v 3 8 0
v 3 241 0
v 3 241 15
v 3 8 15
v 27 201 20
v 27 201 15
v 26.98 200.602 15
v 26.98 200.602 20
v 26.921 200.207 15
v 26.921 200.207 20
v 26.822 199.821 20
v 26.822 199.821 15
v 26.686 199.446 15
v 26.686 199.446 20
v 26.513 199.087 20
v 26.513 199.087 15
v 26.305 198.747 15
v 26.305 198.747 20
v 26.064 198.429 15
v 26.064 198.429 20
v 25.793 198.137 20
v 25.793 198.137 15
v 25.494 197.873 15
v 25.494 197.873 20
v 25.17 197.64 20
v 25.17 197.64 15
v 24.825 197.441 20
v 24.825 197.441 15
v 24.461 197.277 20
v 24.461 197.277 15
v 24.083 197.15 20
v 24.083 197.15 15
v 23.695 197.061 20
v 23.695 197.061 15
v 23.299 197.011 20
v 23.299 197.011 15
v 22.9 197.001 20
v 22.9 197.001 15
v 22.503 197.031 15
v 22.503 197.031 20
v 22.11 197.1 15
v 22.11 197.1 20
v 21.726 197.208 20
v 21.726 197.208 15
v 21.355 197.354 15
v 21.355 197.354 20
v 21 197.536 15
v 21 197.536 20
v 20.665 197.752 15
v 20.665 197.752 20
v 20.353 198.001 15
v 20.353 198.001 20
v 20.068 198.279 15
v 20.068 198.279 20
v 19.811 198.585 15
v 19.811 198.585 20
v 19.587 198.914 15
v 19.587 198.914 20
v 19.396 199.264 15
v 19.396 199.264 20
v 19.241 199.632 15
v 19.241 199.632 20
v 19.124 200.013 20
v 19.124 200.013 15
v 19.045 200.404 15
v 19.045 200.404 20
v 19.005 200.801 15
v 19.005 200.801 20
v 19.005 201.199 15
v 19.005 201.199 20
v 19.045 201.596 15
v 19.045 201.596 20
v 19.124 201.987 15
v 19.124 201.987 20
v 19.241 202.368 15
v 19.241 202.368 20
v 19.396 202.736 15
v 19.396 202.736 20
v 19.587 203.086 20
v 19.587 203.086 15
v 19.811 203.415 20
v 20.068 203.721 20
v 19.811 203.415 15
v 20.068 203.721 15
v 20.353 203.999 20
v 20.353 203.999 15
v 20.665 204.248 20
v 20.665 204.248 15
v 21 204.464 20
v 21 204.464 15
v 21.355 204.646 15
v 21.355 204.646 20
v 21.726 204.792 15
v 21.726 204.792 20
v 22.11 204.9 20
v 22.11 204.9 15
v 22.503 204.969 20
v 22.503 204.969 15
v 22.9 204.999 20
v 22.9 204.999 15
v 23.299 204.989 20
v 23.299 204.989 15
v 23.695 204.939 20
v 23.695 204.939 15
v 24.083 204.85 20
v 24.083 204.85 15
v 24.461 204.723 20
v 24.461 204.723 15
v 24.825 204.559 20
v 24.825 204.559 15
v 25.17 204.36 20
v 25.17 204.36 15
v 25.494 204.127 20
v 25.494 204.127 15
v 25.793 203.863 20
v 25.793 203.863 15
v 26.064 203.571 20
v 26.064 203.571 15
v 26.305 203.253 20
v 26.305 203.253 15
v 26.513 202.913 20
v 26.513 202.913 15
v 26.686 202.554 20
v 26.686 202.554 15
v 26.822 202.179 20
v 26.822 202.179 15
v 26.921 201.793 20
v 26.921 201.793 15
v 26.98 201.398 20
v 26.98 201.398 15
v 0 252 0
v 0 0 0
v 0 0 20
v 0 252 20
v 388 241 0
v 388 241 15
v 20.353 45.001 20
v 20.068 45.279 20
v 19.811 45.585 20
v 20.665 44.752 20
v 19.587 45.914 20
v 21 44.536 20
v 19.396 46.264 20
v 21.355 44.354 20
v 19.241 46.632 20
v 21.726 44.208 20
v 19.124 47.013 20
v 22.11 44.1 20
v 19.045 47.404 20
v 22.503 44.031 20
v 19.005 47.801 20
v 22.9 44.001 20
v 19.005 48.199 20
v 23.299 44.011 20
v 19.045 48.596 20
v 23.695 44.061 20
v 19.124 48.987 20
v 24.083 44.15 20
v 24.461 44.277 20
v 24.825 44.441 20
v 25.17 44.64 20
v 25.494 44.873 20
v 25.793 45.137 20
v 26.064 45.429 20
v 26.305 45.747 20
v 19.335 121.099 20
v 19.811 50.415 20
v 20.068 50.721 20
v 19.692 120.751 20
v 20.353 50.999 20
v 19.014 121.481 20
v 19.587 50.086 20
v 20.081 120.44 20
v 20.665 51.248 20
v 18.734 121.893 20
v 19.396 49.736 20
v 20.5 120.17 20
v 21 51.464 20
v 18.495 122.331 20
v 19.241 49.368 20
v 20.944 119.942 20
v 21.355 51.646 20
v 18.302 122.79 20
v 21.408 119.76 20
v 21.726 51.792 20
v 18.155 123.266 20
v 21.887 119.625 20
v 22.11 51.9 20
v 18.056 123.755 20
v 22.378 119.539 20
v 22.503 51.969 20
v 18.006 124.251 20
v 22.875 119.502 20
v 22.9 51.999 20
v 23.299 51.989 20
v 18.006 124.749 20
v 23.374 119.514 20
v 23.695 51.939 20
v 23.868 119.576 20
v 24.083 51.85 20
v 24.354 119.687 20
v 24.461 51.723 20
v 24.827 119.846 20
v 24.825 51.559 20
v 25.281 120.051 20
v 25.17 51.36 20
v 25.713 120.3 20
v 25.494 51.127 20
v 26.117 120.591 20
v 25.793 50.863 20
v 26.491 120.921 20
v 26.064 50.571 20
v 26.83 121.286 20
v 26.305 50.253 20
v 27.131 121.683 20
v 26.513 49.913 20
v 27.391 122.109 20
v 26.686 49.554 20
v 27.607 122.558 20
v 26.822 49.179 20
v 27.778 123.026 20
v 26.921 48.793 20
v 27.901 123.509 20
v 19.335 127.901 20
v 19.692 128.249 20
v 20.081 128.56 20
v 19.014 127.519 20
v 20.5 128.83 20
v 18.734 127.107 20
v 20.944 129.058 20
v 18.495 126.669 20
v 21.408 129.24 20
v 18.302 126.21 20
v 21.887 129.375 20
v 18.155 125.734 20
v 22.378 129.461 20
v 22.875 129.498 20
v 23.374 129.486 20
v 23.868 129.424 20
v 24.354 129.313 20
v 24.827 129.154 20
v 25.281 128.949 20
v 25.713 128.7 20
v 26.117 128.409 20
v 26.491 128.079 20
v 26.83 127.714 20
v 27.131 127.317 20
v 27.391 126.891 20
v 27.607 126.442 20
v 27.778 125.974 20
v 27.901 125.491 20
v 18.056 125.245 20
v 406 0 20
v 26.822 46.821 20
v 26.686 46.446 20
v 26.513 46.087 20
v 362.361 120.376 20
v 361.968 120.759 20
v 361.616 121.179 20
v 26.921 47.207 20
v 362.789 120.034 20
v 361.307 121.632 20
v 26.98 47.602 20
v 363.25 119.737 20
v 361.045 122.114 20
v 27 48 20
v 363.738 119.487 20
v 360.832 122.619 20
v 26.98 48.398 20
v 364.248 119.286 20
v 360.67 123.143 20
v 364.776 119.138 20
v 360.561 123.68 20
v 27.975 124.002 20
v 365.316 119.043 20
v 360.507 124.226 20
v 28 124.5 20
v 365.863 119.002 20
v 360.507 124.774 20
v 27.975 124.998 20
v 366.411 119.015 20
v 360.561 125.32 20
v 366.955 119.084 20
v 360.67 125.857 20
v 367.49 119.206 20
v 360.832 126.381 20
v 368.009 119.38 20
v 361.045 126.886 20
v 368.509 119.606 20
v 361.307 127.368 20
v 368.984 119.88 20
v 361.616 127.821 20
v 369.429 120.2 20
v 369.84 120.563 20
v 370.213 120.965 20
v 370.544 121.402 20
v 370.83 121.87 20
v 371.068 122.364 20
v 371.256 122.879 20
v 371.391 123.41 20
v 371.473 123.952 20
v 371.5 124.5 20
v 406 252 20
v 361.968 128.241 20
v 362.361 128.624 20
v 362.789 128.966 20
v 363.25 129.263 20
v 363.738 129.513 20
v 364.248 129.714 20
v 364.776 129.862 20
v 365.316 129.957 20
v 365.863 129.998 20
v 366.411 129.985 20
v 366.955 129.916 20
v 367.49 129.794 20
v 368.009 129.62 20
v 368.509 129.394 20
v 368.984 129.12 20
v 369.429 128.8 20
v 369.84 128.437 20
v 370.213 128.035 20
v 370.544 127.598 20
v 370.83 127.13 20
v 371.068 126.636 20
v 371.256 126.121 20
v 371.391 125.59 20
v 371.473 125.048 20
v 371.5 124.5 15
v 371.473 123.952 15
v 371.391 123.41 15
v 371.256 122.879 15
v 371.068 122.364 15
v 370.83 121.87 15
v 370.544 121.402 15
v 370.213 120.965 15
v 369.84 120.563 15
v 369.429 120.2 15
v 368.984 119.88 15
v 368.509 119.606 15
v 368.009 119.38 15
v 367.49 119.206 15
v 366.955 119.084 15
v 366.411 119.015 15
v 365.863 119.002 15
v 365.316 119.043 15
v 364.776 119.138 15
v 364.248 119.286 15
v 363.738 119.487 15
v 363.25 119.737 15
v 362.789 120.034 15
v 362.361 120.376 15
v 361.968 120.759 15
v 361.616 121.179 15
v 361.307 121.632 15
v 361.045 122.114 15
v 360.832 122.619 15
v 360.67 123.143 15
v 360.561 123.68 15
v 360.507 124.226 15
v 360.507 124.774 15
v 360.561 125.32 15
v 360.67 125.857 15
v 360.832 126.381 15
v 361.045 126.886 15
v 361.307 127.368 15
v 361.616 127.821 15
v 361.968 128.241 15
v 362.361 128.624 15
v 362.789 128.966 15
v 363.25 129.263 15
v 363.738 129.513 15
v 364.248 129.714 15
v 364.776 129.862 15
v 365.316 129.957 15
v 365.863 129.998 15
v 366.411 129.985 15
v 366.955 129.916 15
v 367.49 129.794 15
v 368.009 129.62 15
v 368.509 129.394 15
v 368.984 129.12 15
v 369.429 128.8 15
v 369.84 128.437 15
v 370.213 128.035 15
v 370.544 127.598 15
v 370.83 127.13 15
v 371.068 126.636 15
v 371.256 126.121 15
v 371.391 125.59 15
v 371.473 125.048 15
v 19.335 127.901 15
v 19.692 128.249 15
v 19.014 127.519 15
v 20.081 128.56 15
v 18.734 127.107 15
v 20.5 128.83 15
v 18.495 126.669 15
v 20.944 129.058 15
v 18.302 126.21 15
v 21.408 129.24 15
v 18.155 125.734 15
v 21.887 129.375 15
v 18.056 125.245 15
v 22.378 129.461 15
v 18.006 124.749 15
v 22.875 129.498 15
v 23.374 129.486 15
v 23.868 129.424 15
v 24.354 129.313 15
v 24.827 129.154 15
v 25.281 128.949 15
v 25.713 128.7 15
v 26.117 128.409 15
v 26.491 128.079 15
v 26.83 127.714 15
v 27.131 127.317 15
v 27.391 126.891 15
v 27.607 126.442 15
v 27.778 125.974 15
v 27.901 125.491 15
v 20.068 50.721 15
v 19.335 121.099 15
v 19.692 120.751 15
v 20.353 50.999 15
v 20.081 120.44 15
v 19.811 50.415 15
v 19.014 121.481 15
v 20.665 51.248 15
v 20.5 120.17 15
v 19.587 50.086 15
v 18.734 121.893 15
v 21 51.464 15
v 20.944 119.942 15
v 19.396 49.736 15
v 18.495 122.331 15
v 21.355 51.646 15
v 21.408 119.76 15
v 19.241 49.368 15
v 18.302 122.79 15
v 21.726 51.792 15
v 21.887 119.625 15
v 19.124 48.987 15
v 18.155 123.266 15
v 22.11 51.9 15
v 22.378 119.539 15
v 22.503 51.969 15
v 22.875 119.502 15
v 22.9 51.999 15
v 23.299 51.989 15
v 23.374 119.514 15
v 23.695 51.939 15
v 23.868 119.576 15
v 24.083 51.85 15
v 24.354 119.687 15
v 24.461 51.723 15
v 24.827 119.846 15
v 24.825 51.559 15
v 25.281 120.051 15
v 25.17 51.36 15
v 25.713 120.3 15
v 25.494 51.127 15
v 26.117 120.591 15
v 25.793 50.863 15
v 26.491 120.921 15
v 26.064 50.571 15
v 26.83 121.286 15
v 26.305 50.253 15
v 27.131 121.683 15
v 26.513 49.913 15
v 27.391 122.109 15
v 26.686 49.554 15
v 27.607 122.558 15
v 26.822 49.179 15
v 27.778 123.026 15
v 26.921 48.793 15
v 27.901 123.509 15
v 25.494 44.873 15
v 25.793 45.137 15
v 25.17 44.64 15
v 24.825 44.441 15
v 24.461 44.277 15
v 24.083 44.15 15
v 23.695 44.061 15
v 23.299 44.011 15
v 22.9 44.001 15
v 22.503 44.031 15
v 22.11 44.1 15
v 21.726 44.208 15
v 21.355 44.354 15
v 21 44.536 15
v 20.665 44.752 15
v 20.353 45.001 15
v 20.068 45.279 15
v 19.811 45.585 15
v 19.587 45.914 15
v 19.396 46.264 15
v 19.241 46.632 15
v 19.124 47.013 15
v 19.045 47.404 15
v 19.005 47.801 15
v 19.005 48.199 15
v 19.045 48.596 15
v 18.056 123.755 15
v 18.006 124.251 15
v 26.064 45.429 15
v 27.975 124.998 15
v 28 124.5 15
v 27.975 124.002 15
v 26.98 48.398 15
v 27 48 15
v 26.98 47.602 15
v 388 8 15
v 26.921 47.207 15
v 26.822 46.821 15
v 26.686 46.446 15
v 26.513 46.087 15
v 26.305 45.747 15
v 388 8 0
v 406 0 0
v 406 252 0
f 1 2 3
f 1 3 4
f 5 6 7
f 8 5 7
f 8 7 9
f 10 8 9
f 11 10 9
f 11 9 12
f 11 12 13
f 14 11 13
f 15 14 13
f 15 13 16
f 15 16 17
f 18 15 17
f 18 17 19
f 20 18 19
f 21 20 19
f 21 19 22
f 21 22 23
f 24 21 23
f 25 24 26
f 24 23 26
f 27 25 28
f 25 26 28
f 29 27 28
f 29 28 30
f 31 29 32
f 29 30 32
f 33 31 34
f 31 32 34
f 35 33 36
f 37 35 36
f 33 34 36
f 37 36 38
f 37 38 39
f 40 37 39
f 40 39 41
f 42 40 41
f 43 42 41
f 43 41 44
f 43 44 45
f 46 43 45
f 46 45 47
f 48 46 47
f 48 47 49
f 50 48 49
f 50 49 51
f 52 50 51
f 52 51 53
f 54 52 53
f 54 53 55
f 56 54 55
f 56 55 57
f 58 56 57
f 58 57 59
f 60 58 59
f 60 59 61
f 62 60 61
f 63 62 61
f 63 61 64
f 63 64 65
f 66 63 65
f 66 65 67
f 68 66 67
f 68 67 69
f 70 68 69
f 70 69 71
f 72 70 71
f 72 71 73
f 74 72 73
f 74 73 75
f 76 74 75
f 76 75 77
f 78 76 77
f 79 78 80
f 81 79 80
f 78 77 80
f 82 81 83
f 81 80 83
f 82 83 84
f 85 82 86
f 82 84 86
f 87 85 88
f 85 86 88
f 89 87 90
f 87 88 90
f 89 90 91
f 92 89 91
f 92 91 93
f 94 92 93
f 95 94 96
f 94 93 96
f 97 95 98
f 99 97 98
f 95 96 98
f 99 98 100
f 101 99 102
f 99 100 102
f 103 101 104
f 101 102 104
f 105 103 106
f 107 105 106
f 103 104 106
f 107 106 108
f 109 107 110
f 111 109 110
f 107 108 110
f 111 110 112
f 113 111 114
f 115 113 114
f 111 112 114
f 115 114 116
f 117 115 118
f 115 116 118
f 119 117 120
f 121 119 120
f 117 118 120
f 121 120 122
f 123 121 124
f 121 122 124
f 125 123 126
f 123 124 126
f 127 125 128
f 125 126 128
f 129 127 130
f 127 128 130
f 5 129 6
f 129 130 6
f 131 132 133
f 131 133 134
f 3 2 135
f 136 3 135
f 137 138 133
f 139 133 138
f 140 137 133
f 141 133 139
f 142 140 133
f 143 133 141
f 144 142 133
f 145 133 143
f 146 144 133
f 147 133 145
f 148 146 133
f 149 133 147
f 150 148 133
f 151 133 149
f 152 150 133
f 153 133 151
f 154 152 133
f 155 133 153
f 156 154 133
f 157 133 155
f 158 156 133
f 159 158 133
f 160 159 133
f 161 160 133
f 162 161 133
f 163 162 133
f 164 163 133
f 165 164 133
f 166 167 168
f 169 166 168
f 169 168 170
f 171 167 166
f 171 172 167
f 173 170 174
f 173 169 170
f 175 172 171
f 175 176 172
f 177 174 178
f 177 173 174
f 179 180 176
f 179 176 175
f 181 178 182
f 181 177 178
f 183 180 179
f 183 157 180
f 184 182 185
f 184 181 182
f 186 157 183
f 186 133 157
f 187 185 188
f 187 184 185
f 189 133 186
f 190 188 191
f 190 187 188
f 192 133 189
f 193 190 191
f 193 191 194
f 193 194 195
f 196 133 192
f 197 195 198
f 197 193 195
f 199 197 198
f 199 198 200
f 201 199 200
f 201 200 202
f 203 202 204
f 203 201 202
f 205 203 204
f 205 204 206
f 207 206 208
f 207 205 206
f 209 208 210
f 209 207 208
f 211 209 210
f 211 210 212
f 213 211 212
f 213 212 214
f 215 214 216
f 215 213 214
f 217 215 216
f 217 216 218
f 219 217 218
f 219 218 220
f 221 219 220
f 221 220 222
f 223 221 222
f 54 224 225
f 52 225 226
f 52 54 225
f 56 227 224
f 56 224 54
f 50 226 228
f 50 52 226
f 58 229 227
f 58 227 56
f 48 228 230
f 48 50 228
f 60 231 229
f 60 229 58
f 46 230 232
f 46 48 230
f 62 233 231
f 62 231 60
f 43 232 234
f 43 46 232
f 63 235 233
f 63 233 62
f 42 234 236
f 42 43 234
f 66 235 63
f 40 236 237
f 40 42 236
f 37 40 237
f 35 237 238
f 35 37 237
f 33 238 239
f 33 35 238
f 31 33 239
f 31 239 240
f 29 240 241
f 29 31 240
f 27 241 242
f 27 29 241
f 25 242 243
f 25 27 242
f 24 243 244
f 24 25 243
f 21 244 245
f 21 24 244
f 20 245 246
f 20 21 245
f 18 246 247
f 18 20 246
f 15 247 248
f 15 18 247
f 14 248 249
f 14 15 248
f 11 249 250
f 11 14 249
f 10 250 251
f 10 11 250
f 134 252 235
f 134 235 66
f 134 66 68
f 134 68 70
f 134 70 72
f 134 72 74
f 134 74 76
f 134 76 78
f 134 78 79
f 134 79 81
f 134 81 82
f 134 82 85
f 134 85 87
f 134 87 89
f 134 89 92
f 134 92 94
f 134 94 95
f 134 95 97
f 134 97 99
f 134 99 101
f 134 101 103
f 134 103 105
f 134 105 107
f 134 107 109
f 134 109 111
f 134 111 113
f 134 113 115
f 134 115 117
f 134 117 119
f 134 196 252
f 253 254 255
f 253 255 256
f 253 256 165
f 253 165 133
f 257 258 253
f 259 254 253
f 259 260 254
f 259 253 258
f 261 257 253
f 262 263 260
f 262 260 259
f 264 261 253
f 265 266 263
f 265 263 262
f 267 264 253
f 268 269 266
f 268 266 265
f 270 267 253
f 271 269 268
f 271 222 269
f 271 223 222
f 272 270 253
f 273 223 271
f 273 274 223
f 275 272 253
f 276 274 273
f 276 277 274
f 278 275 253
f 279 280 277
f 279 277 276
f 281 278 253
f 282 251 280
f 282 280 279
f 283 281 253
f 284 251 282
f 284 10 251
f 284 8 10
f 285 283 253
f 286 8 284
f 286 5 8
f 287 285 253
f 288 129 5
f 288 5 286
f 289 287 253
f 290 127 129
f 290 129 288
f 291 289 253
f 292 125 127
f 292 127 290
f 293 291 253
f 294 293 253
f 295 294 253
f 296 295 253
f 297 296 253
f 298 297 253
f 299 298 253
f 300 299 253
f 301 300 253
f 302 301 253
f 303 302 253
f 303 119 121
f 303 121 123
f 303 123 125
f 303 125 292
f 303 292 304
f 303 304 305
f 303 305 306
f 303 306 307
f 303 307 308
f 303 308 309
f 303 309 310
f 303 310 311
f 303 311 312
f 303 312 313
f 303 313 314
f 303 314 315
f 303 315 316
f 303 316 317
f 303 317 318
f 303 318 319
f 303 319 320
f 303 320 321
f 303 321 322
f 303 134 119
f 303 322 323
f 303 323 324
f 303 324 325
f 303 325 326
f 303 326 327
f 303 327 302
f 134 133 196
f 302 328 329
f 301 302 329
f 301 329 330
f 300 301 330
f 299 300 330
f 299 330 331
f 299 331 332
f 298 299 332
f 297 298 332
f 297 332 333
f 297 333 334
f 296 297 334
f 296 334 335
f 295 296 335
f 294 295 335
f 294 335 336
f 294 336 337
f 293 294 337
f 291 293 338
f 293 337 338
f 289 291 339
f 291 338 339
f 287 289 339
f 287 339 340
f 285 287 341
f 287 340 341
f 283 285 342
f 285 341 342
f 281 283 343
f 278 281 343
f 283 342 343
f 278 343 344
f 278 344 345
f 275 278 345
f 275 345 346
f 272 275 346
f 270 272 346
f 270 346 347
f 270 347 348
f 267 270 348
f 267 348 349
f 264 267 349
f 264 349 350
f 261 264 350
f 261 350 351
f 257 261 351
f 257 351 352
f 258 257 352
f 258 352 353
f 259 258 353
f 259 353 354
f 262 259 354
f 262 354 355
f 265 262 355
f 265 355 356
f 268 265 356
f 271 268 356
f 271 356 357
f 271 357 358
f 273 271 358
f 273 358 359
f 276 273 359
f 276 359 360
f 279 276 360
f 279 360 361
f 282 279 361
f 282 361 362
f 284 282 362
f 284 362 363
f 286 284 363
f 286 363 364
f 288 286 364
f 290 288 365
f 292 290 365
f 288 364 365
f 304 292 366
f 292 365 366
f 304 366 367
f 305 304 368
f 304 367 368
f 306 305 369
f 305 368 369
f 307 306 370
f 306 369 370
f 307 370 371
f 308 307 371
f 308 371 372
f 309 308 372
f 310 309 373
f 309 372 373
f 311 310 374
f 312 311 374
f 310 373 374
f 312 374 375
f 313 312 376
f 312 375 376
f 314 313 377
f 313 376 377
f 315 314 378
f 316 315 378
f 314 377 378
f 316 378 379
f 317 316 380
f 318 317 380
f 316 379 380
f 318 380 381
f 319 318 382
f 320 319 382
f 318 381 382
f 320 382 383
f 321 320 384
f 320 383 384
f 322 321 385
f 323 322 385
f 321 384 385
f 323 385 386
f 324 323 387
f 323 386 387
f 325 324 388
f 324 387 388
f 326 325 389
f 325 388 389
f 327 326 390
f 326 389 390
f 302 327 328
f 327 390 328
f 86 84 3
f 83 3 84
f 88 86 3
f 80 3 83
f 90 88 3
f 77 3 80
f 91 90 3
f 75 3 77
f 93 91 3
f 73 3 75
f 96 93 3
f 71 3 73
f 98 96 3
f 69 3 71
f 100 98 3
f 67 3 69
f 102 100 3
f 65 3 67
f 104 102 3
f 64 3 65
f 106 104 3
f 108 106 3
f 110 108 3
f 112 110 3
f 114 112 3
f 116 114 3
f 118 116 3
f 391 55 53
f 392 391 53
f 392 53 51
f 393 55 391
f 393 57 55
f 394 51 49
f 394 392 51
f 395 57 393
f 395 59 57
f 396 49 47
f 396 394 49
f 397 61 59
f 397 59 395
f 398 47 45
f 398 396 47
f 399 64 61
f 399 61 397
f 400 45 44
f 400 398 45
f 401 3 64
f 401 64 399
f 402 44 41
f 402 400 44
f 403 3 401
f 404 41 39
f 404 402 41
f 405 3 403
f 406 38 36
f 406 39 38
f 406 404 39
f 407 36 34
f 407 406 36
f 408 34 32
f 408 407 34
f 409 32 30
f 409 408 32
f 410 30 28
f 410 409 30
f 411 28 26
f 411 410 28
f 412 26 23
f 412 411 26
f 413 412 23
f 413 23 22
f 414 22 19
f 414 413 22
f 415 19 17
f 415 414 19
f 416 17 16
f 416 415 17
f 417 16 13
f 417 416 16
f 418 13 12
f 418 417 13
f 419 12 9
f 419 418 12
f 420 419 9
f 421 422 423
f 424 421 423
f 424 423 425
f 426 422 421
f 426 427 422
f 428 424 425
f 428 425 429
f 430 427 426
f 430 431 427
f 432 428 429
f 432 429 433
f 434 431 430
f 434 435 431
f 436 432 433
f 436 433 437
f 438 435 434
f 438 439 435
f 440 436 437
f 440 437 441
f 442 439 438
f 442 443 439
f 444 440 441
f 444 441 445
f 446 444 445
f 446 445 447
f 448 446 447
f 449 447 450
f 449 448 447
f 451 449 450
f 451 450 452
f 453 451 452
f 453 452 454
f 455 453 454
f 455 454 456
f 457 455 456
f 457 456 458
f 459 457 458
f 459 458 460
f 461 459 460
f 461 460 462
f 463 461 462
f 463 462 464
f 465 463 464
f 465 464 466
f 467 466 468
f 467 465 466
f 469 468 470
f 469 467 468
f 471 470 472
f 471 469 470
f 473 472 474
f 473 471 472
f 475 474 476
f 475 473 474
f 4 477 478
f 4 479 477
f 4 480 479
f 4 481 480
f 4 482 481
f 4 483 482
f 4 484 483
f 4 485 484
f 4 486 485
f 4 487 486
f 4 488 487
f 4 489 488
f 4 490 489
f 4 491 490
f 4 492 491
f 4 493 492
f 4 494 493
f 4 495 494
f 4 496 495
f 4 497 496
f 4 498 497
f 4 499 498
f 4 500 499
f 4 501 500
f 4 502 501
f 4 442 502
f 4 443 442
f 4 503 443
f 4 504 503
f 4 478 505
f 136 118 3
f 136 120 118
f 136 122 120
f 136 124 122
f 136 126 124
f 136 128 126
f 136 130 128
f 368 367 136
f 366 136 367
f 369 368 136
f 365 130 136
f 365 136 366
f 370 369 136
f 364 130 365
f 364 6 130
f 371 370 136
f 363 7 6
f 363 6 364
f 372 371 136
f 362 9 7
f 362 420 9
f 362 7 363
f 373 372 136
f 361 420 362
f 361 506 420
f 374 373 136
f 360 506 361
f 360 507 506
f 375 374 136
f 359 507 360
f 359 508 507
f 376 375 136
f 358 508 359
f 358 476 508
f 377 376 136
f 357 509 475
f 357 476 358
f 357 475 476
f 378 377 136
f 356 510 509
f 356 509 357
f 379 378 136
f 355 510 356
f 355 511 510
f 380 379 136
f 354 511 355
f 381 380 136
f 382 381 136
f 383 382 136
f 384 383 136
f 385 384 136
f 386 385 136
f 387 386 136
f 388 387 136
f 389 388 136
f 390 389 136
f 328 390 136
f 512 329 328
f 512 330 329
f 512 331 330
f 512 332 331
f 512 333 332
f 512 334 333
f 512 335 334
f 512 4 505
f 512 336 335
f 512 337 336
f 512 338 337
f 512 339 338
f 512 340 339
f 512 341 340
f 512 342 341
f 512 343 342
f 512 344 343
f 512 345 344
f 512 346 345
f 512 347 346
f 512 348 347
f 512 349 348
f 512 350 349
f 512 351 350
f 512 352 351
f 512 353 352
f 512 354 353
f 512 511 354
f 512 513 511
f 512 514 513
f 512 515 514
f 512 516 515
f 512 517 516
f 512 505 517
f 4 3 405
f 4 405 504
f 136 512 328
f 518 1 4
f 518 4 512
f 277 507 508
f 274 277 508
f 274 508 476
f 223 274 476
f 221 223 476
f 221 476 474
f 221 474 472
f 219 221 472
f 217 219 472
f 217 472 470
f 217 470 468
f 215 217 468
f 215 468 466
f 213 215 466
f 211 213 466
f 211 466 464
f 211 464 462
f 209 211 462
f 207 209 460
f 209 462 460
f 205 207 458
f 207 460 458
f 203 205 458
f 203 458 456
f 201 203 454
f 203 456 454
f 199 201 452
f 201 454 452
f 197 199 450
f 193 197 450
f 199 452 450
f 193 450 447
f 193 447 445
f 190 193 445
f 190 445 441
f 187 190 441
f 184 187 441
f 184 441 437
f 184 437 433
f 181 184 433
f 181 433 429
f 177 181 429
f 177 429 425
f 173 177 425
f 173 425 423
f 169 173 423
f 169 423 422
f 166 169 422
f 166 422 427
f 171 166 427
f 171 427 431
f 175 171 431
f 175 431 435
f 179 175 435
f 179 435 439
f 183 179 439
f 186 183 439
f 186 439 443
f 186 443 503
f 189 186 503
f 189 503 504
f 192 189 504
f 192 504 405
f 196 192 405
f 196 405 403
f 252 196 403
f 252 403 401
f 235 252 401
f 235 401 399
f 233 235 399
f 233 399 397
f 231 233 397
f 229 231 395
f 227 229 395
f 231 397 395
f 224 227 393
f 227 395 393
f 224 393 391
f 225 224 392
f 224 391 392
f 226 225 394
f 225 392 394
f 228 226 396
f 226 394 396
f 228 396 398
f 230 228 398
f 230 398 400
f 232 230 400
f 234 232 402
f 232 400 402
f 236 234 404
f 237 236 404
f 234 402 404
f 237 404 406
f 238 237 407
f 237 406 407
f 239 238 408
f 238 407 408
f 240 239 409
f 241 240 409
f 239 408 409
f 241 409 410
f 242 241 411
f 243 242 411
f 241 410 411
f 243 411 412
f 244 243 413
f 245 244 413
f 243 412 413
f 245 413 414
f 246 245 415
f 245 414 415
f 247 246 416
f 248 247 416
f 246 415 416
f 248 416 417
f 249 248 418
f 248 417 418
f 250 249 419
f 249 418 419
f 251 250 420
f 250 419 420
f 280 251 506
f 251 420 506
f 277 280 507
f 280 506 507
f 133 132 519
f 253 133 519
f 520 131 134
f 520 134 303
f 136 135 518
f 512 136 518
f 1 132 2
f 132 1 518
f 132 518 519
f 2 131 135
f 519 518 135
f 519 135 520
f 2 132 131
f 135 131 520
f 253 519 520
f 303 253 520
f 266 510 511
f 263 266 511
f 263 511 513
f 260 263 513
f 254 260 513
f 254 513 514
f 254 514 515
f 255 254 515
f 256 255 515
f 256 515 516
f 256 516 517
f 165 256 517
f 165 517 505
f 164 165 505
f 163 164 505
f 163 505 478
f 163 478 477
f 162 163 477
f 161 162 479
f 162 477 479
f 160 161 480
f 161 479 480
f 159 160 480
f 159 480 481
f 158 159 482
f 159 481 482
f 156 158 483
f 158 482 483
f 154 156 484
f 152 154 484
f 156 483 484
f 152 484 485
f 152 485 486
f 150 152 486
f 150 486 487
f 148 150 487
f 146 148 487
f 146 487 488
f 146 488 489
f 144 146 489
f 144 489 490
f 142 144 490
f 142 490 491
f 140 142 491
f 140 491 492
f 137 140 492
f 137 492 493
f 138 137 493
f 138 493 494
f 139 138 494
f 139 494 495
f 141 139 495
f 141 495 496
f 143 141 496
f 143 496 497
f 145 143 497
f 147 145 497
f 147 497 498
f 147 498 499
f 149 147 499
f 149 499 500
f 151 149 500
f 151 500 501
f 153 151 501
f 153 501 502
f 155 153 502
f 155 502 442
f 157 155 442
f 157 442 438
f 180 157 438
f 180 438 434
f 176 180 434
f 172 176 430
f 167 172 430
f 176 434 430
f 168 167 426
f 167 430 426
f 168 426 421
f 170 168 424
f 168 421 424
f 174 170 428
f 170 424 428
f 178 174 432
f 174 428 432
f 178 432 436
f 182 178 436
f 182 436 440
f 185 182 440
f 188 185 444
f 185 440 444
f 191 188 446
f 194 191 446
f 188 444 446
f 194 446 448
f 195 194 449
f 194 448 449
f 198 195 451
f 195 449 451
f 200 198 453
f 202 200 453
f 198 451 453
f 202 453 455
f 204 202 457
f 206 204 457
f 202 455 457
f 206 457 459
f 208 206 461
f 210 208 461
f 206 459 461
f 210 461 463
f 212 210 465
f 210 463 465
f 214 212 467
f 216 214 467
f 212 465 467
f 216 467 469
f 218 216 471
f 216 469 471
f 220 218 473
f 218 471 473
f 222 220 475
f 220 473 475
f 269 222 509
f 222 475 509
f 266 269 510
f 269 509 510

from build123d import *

# Parameters (mm, degrees)
SKETCH_W        = 406
SKETCH_H        = 252
PAD_DEPTH       = 20
SKETCH001_W     = 385
SKETCH001_H     = 233
POCKET_DEPTH    = 15
SKETCH002_R     = 4
SKETCH002_R_2   = 5
SKETCH002_R_3   = 5.5
POCKET001_DEPTH = 5.001


with BuildPart() as part:
    # Sketch → Pad (new body)
    with BuildSketch(Plane.XY):
        with Locations((203, 126)):
            Rectangle(SKETCH_W, SKETCH_H)
    extrude(amount=PAD_DEPTH)

    # Sketch001 (on Face5 of Pad) → Pocket (cut)
    with BuildSketch(Plane(origin=(0, 0, 0), x_dir=(1, 0, 0), z_dir=(0, 0, -1))):
        with Locations((195.5, -124.5)):
            Rectangle(SKETCH001_W, SKETCH001_H)
    extrude(amount=-POCKET_DEPTH, mode=Mode.SUBTRACT)

    # Sketch002 (on Face11 of Pocket) → Pocket001 (cut, through all)
    with BuildSketch(Plane(origin=(0, 0, 15), x_dir=(1, 0, 0), z_dir=(0, 0, -1))):
        with Locations((23, -201)):
            Circle(SKETCH002_R)
        with Locations((23, -124.5)):
            Circle(SKETCH002_R_2)
        with Locations((23, -48)):
            Circle(SKETCH002_R)
        with Locations((366, -124.5)):
            Circle(SKETCH002_R_3)
    extrude(amount=-POCKET001_DEPTH, mode=Mode.SUBTRACT)


solid = part.part
